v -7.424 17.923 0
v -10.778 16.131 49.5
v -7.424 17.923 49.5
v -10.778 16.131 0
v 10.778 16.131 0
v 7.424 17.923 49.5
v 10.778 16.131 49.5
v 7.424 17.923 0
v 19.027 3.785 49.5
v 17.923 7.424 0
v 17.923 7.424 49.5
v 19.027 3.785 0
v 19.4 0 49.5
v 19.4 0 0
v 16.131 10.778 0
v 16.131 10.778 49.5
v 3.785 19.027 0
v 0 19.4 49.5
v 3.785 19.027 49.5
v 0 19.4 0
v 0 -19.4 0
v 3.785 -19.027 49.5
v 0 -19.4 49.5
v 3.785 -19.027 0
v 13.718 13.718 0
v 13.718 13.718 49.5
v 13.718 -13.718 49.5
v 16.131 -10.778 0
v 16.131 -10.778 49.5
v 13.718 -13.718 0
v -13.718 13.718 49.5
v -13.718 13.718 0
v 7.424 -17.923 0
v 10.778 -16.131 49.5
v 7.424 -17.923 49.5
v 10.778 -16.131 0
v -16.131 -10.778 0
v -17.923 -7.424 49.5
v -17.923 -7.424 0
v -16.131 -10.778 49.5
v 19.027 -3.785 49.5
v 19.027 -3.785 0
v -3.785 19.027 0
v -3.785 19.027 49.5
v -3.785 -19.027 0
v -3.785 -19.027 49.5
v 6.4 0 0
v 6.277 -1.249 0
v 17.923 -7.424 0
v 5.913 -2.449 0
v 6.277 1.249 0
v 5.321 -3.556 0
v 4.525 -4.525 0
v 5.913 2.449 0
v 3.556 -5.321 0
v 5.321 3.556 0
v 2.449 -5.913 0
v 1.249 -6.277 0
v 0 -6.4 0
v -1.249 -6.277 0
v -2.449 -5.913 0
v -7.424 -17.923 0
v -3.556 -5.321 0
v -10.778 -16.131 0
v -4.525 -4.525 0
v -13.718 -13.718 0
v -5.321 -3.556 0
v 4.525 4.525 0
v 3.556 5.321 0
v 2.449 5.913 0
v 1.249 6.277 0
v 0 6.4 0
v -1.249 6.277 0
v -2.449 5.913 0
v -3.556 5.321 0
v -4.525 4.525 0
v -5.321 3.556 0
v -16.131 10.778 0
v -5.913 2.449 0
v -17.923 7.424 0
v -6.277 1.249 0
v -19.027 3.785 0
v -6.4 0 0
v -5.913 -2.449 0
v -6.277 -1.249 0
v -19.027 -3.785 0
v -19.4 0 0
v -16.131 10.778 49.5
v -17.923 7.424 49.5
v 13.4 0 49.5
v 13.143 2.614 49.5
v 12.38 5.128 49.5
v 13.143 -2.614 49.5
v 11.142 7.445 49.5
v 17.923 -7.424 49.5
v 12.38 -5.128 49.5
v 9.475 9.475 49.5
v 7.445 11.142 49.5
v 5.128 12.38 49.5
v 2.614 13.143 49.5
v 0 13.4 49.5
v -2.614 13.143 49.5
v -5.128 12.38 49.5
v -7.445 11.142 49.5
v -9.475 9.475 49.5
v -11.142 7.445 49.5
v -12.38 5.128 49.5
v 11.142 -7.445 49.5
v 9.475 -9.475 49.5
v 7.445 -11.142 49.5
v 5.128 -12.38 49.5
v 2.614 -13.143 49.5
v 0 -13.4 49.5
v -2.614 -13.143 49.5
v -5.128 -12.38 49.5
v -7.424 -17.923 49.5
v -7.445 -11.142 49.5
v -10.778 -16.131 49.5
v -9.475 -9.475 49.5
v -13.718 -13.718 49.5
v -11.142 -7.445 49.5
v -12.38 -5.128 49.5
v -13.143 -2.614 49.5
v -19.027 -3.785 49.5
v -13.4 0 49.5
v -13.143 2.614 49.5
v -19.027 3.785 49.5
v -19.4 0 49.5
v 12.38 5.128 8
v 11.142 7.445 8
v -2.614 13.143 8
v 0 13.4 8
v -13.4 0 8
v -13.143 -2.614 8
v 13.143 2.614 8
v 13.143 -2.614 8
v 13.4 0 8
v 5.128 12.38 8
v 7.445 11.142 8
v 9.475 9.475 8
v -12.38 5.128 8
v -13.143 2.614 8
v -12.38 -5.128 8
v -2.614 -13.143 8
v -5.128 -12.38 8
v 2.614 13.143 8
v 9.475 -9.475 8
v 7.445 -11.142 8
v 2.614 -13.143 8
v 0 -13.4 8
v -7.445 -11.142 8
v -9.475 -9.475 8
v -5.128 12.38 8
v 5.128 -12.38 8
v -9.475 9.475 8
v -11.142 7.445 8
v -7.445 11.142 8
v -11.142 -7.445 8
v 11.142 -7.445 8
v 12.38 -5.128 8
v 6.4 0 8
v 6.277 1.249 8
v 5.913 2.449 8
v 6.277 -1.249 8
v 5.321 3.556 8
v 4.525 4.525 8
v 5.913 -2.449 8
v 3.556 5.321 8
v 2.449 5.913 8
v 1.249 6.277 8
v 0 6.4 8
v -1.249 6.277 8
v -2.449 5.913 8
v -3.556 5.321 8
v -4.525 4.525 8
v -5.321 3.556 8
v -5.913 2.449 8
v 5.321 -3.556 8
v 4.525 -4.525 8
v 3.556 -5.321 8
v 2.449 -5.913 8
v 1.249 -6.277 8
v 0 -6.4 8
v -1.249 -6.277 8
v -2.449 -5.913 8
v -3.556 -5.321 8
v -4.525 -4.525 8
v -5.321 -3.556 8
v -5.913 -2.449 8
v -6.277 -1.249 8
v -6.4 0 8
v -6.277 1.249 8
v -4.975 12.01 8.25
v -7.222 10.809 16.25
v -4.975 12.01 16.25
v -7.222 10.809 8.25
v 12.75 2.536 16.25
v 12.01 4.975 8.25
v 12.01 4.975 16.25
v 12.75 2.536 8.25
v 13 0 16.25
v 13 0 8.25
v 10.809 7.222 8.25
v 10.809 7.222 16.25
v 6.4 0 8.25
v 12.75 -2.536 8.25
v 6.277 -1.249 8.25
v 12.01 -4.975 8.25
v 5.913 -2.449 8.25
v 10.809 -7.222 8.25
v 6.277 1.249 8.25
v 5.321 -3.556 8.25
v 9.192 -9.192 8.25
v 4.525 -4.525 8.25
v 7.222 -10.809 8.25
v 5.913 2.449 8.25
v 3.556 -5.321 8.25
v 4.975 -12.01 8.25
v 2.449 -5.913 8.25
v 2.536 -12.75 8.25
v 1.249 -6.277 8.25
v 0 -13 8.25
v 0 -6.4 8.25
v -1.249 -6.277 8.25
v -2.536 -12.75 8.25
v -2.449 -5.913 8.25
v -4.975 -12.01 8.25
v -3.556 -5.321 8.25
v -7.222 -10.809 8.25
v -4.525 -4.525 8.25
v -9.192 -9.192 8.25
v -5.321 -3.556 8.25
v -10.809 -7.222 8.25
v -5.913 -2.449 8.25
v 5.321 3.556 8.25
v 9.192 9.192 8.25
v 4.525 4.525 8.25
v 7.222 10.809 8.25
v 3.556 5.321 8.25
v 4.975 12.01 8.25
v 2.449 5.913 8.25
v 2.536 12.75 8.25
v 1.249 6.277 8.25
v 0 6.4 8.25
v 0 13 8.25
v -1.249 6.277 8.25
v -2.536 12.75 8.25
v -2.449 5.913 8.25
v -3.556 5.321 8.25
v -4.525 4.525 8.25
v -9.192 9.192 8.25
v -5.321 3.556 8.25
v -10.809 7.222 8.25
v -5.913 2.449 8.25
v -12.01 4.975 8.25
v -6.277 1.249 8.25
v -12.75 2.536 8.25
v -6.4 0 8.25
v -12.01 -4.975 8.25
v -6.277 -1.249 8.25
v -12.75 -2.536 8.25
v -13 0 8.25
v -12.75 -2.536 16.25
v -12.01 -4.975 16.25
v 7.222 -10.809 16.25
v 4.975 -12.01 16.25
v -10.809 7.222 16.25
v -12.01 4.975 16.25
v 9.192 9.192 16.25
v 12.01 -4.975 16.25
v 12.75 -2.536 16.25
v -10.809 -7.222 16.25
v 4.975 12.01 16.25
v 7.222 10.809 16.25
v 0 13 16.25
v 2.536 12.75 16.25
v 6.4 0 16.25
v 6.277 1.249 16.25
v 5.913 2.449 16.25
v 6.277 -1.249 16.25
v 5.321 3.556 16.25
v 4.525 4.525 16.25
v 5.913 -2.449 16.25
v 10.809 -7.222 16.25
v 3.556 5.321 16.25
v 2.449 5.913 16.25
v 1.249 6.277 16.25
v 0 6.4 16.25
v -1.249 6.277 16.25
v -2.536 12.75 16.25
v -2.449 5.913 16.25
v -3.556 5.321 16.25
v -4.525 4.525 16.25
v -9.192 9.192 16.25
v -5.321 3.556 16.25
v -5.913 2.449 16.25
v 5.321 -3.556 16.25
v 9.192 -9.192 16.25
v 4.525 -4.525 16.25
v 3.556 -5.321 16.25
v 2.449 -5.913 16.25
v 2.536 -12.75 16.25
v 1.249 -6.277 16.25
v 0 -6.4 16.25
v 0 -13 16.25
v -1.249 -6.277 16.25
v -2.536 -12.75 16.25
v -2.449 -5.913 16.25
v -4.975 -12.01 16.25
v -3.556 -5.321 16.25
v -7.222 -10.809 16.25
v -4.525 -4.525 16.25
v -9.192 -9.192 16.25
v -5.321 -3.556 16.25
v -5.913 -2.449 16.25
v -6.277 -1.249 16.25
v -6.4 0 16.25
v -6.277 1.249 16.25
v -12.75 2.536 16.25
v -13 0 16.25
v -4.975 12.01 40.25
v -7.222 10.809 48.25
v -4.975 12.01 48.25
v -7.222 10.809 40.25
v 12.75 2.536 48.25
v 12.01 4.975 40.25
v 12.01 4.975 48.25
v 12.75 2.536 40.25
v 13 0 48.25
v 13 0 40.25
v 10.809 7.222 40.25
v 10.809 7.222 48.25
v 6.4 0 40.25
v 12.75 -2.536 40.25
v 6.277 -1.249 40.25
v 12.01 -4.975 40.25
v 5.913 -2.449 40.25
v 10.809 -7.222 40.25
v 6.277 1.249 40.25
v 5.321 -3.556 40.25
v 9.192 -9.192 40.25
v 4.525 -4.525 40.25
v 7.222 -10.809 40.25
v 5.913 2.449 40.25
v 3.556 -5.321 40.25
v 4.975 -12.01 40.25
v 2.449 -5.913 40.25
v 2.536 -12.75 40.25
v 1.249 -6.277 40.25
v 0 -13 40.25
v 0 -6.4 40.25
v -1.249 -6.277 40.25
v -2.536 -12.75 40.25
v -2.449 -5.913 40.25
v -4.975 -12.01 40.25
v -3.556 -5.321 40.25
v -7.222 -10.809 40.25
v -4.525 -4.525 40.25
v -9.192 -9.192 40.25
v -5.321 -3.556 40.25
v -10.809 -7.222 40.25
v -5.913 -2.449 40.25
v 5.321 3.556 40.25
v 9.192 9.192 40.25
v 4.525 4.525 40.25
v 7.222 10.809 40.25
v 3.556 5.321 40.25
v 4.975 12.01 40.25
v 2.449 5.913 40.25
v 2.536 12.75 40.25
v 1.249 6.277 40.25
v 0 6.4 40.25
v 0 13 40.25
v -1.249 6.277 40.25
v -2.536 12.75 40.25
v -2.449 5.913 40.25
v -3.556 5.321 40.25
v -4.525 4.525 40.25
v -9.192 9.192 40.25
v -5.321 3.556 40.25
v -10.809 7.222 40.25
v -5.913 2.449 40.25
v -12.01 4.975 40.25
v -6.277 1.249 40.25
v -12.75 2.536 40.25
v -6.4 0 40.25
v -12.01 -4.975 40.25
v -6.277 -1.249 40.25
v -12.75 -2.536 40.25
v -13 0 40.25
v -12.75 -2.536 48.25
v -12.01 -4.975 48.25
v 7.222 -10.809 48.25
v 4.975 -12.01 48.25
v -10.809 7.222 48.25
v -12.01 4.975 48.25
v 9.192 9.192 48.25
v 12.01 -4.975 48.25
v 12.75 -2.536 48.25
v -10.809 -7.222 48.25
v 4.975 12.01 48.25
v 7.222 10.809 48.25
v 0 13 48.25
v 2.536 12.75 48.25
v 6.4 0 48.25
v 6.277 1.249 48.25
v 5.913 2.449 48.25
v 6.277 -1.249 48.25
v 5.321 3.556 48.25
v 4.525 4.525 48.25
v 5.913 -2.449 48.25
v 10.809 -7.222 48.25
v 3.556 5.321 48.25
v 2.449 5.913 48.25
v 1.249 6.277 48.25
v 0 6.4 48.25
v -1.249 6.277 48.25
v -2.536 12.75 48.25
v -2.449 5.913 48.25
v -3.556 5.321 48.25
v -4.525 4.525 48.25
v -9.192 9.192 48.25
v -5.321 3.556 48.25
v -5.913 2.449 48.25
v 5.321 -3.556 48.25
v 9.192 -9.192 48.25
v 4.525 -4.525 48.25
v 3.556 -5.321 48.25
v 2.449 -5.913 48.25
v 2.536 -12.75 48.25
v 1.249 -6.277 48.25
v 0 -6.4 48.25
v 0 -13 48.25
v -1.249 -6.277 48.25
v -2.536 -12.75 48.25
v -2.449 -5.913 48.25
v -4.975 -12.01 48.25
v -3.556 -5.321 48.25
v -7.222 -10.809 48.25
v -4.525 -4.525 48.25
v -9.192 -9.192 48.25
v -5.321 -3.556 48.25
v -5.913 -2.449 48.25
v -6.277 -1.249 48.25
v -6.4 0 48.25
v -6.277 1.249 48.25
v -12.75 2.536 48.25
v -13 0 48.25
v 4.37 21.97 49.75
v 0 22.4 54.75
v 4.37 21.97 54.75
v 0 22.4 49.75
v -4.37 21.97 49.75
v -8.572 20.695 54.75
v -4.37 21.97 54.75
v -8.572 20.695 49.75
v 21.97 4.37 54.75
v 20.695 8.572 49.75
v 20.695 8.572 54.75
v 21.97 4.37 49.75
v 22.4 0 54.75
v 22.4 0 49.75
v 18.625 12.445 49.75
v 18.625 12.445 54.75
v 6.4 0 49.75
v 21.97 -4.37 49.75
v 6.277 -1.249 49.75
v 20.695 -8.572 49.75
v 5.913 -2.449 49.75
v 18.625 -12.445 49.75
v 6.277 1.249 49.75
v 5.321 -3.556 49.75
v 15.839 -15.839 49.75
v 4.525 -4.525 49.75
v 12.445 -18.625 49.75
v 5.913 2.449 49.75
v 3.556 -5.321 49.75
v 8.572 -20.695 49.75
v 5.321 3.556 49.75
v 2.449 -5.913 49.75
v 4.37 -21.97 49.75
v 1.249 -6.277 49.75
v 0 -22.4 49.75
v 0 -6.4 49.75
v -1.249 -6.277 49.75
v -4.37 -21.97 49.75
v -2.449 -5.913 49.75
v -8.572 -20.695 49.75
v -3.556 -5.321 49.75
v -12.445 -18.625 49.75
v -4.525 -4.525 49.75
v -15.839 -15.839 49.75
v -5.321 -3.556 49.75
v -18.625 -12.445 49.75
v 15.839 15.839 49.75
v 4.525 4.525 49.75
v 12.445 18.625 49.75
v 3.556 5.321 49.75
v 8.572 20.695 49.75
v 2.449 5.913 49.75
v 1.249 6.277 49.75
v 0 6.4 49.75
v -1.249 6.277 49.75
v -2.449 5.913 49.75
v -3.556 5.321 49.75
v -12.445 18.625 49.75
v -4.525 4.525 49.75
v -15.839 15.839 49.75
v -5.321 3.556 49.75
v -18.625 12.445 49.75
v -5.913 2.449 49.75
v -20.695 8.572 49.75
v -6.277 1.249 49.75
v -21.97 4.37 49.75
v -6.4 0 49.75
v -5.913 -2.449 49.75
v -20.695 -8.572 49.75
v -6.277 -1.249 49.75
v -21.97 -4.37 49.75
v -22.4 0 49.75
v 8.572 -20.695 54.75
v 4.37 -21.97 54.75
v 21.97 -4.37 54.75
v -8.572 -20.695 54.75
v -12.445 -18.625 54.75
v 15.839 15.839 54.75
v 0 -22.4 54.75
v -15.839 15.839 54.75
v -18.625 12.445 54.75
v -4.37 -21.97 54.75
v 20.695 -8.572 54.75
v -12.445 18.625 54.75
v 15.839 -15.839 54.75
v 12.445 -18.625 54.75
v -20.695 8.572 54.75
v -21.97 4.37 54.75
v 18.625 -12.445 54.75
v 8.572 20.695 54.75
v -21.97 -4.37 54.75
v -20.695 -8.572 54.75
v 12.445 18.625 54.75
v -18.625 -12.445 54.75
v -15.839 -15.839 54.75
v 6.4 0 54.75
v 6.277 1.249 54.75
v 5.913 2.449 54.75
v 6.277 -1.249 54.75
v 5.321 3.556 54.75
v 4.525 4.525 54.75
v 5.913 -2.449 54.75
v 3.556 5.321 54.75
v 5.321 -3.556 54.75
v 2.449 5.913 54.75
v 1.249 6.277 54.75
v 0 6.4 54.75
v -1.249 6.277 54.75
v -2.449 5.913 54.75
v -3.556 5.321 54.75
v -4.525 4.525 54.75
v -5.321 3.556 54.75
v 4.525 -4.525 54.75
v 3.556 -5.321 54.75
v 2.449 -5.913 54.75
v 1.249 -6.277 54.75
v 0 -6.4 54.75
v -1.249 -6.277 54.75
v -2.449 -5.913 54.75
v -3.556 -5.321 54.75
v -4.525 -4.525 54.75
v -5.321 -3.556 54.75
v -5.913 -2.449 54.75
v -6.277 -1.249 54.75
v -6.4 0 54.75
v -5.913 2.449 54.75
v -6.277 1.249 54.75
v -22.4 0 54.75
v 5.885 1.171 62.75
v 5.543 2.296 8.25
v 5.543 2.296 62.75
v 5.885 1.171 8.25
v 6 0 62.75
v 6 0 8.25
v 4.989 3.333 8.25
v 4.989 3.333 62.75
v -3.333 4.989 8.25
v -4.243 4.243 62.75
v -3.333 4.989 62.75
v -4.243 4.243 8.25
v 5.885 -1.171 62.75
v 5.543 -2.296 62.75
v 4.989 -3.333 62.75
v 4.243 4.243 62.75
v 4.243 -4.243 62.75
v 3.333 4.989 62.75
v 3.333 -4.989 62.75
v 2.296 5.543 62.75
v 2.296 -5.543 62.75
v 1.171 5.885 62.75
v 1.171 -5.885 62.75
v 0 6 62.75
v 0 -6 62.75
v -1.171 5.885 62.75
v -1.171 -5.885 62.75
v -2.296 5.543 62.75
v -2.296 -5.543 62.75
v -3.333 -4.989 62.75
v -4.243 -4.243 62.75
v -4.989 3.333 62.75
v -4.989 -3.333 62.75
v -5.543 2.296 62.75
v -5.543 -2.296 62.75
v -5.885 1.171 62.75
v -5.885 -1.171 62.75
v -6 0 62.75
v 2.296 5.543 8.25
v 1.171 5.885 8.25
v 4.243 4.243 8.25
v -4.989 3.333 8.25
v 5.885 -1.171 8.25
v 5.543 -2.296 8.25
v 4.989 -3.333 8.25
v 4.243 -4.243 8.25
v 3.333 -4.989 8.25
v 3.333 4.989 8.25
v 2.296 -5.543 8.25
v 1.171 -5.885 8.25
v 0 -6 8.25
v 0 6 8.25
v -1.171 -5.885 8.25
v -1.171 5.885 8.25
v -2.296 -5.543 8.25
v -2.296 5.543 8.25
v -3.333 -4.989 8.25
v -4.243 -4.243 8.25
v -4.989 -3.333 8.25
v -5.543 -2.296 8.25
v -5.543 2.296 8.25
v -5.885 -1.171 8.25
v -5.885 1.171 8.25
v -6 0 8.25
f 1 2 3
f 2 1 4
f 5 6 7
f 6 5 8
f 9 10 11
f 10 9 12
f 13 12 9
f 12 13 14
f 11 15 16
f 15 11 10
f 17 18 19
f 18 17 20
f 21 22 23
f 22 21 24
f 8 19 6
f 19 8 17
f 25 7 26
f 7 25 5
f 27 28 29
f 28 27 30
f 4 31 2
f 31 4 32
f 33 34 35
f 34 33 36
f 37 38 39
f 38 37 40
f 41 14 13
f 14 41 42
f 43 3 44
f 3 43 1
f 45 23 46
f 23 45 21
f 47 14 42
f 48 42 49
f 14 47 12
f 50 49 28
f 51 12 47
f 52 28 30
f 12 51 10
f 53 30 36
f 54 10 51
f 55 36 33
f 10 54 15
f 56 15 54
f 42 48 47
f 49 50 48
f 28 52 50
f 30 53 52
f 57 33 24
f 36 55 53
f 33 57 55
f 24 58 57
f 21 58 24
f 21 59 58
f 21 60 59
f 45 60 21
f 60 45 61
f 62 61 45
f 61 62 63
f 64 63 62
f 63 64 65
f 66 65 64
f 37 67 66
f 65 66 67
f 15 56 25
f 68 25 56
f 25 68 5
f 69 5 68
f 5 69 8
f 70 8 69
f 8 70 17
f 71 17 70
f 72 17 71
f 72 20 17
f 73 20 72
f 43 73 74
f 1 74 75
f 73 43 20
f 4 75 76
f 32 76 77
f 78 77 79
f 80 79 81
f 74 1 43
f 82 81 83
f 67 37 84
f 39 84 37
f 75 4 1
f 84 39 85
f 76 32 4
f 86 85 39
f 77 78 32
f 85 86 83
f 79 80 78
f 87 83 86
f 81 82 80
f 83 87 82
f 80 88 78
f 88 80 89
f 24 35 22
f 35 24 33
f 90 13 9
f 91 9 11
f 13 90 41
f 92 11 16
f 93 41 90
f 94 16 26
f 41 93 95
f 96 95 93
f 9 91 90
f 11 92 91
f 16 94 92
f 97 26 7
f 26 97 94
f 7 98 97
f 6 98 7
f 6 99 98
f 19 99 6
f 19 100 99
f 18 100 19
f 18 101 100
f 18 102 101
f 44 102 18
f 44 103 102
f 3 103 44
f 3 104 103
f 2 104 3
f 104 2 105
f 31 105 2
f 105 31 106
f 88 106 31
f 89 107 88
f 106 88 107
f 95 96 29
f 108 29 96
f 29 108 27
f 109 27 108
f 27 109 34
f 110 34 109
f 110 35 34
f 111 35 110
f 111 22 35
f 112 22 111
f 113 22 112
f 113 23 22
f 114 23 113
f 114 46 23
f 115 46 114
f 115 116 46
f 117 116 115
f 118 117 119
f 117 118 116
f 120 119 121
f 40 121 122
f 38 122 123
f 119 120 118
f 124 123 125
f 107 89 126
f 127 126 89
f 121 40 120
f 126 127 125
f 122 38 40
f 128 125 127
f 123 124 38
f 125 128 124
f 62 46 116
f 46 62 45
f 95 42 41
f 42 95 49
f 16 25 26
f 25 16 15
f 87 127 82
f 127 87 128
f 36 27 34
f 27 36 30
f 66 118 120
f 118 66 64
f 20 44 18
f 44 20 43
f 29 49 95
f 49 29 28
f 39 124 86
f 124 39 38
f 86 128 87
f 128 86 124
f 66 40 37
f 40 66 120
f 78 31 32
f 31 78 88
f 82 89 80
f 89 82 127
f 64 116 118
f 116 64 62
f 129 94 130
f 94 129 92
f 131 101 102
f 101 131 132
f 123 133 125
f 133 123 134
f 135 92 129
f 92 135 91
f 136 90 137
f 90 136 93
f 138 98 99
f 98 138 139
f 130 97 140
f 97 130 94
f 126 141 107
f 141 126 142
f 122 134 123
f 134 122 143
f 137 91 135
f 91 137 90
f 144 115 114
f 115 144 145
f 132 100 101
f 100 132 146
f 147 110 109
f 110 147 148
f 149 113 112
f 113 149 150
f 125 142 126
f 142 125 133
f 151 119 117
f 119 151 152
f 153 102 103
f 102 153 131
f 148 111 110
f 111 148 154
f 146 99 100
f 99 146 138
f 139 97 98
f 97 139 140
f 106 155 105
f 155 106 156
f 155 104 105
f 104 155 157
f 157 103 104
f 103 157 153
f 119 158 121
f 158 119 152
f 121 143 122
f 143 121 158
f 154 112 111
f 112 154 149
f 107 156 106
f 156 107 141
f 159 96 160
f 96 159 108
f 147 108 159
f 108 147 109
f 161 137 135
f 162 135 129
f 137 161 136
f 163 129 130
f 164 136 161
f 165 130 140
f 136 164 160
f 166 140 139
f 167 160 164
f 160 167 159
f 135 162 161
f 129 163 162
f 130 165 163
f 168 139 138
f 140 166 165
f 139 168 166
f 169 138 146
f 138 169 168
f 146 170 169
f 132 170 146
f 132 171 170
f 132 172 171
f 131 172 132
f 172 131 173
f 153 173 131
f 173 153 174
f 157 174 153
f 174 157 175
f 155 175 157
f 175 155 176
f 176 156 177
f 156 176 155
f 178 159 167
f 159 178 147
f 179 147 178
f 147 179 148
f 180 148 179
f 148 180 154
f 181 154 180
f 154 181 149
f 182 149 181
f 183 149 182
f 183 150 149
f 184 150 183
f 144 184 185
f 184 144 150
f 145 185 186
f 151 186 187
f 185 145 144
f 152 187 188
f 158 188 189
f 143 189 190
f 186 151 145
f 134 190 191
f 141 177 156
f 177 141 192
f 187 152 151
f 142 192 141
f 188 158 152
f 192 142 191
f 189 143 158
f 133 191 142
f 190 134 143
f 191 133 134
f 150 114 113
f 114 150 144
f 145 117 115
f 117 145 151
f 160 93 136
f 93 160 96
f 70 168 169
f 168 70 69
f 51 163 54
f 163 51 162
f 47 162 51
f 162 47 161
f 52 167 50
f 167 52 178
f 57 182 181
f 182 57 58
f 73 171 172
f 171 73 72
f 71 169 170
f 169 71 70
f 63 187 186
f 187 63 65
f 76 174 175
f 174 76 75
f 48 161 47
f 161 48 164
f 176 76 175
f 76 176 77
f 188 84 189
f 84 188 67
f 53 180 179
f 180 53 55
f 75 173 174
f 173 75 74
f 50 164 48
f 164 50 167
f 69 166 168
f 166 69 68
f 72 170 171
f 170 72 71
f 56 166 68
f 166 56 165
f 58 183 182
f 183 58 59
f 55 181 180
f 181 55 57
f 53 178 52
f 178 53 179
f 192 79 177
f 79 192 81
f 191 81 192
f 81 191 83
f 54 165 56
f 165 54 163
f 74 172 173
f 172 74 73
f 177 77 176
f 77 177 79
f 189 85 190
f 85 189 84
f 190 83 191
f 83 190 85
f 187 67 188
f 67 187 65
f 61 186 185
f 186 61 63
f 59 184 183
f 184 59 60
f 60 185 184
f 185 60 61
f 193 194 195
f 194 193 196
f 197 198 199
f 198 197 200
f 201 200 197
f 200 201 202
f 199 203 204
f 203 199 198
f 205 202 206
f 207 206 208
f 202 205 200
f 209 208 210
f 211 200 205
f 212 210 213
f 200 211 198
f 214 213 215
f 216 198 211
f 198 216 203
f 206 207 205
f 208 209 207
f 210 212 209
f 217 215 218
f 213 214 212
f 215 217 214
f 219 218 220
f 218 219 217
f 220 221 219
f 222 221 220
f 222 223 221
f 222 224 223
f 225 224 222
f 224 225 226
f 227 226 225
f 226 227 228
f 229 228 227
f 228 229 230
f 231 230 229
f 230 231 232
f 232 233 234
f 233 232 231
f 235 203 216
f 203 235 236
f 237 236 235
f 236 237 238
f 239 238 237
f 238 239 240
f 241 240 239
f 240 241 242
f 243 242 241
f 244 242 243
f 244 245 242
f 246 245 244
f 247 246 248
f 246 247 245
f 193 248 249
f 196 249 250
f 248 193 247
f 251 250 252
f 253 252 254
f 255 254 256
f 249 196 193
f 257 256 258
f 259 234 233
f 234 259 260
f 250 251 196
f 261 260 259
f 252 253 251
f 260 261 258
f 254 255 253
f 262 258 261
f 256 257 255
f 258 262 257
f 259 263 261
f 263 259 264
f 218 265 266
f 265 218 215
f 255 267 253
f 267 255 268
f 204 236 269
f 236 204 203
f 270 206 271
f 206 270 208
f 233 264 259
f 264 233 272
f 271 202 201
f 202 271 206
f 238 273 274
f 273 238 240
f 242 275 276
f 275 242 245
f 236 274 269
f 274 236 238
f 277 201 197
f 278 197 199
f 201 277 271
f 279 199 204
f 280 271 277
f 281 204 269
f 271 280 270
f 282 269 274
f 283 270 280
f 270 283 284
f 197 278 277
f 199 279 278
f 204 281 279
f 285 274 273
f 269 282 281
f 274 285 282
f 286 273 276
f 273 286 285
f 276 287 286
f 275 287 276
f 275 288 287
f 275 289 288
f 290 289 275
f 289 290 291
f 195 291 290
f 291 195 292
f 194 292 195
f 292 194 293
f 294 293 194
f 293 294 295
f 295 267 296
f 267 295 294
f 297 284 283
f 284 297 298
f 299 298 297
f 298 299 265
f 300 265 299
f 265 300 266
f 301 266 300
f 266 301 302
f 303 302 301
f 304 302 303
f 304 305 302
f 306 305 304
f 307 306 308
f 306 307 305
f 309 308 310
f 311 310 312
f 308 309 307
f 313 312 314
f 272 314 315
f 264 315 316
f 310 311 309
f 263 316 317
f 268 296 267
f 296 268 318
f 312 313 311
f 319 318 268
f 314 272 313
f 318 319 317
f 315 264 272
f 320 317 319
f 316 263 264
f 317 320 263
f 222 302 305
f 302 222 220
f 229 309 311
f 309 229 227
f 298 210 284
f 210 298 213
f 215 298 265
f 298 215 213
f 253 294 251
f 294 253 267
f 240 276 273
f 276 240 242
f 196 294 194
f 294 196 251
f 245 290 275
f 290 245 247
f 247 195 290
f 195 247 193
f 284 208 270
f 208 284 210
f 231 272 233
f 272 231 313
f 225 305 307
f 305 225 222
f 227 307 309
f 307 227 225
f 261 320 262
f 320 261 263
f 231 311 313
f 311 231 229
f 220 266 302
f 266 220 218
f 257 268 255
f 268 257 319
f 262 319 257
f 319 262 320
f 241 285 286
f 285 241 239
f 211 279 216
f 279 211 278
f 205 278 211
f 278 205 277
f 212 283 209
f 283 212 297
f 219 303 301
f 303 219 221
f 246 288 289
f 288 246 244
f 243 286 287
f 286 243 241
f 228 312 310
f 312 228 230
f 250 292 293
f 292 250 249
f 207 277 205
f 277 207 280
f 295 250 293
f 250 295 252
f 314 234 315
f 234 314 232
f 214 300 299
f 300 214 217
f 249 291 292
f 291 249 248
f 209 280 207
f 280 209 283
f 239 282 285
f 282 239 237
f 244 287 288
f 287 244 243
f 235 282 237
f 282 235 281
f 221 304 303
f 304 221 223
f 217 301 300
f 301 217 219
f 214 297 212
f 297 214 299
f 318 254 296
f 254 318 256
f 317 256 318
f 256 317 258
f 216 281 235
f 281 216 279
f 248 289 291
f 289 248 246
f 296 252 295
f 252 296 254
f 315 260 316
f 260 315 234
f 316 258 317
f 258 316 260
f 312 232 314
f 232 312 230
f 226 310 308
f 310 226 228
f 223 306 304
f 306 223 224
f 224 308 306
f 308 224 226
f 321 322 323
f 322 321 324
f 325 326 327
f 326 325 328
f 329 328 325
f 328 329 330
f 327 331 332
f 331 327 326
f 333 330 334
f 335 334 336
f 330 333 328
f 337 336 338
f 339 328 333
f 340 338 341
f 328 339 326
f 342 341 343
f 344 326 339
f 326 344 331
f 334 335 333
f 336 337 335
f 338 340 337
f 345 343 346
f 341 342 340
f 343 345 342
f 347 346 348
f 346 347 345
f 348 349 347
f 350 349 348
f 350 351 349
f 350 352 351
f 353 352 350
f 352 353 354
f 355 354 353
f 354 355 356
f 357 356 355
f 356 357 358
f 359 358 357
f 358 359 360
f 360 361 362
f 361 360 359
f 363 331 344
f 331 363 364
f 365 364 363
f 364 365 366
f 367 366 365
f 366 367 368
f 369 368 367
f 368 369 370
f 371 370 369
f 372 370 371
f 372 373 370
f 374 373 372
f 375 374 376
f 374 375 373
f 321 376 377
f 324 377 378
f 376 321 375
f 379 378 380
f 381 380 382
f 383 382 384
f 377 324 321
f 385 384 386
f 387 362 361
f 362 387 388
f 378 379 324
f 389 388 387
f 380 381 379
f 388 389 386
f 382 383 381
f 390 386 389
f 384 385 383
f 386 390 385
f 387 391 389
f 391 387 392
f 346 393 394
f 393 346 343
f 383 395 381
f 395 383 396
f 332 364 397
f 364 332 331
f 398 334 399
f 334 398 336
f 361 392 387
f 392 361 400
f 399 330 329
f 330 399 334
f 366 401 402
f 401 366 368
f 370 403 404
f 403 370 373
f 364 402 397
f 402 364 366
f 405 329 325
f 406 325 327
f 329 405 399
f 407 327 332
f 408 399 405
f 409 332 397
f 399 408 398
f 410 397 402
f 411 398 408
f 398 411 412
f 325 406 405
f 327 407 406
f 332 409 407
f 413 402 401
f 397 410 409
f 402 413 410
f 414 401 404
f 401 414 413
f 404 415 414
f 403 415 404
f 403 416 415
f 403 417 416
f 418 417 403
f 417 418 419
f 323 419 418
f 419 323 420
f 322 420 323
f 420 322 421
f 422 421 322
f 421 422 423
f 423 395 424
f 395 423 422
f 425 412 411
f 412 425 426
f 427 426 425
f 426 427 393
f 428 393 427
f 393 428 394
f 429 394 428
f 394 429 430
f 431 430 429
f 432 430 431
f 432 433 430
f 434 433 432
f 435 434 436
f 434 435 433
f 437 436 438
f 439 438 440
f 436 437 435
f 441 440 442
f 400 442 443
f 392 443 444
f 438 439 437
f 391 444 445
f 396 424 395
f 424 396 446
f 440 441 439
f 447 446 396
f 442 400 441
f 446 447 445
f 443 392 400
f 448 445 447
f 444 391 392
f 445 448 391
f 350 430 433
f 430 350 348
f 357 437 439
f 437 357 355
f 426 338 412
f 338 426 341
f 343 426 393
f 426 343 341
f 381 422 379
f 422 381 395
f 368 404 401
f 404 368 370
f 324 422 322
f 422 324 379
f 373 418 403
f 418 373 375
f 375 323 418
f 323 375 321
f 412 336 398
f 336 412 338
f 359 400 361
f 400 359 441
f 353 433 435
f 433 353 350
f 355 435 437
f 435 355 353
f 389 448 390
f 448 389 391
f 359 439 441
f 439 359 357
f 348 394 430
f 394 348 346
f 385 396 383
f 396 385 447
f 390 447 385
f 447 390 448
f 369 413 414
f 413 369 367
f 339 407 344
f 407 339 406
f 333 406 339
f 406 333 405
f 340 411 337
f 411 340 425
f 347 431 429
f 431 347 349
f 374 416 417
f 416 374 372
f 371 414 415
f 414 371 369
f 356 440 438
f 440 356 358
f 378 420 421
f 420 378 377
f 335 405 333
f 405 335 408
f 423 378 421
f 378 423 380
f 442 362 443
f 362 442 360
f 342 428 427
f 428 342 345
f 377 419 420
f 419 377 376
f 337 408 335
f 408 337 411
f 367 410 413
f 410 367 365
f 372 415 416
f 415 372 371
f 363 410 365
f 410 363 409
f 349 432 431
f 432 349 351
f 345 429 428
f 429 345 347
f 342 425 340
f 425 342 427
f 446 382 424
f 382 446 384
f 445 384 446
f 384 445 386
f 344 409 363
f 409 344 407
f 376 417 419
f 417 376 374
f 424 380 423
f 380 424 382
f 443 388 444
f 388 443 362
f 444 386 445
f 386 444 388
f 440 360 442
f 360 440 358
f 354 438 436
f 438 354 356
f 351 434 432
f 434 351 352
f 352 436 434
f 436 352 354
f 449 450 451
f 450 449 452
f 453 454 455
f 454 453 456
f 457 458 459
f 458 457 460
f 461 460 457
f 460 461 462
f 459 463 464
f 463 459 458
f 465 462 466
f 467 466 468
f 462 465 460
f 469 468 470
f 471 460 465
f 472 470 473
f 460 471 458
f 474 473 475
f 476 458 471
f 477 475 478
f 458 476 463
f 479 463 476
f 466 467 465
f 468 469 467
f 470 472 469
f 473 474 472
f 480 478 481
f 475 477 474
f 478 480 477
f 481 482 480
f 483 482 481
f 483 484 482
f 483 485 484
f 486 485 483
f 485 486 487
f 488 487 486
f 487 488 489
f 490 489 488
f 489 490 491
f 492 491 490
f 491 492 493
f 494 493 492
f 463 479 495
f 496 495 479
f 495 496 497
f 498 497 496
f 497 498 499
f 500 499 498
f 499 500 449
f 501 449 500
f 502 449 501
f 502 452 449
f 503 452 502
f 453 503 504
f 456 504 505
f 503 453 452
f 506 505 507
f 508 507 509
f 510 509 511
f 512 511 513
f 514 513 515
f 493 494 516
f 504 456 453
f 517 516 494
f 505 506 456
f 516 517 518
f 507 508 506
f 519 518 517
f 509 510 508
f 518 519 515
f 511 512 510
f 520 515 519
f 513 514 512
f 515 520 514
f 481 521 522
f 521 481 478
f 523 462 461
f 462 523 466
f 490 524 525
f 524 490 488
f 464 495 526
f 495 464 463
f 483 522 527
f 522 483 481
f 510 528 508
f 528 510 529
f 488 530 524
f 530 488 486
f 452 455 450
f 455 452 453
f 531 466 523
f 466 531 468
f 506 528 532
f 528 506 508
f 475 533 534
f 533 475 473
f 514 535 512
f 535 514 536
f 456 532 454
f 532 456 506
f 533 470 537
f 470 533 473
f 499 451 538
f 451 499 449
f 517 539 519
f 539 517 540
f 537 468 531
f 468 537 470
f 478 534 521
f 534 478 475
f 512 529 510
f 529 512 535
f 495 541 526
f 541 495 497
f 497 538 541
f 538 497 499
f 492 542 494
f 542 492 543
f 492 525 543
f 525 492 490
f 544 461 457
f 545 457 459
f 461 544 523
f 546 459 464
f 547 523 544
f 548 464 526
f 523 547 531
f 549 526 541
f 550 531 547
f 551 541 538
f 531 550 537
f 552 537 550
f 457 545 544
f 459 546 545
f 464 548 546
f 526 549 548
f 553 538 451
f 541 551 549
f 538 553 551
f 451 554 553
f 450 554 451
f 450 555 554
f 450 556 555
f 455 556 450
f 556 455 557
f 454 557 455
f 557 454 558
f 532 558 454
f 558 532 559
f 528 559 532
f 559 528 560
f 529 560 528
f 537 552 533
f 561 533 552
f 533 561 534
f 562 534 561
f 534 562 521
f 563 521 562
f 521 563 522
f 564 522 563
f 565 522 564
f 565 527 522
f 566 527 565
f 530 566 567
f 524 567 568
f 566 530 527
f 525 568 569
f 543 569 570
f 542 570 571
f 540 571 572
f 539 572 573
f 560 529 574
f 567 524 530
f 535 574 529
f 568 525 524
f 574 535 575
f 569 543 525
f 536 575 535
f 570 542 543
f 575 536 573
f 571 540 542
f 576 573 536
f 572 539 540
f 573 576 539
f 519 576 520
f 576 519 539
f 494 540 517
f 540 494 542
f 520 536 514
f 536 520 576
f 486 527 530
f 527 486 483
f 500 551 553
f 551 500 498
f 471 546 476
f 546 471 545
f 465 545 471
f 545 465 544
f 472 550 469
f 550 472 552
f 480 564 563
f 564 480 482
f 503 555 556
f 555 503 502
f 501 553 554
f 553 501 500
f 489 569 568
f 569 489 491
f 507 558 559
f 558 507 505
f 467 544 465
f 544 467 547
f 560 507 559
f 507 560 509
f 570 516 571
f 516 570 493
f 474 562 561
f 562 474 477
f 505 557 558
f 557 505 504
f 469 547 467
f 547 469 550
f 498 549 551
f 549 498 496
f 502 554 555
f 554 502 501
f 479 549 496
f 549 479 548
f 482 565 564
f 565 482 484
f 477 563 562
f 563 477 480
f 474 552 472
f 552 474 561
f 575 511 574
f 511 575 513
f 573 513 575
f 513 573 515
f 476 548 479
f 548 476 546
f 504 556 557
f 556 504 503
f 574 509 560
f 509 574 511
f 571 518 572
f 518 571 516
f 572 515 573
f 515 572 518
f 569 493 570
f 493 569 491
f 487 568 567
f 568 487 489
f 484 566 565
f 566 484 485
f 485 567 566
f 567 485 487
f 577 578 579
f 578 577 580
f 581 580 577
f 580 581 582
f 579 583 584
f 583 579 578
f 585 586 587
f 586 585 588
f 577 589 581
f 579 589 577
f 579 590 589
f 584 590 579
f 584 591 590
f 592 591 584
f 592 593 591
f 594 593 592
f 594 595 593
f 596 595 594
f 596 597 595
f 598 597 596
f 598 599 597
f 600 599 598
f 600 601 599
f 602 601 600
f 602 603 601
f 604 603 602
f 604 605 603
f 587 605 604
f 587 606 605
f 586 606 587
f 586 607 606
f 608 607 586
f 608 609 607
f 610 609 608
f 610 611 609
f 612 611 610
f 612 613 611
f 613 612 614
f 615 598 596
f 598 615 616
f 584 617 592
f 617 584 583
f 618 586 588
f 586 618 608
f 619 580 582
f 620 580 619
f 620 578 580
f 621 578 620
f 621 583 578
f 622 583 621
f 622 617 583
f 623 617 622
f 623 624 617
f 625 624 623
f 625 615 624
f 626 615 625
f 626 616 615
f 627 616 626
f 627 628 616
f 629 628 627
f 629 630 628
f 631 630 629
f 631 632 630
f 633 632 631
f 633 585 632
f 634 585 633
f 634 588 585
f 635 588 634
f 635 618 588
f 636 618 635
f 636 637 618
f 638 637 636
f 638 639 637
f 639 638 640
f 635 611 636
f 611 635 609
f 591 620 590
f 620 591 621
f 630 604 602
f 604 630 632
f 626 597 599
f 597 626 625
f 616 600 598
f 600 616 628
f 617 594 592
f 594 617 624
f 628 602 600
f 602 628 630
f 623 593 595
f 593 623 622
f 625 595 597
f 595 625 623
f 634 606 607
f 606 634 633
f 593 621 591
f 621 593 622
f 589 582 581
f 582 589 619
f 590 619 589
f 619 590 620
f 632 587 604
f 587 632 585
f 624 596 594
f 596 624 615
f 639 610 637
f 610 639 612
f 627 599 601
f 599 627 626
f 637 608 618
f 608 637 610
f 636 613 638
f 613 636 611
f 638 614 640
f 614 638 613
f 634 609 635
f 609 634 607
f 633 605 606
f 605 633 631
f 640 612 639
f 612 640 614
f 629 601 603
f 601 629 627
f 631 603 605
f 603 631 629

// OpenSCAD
$fn = 32;

// ------------------------------------------------------------------------
// Shaft station: cup d38.8 x 49.5 mm, shaft d12
// Every part is its own module, assembly() places every instance.
// ------------------------------------------------------------------------

// --- part 1 ---
module housing_cup() {
  difference() {
    cylinder(h = 49.5, d = 38.8);
    translate([0, 0, 8]) cylinder(h = 42.5, d = 26.8);
    translate([0, 0, -1]) cylinder(h = 10, d = 12.8);
  }
}

// --- part 2 ---
module bearing_lower() {
  difference() {
      translate([0, 0, 0]) cylinder(h = 8, d = 26);
      translate([0, 0, -1]) cylinder(h = 10, d = 12.8);
    }
}

// --- part 3 ---
module bearing_upper() {
  difference() {
      translate([0, 0, 0]) cylinder(h = 8, d = 26);
      translate([0, 0, -1]) cylinder(h = 10, d = 12.8);
    }
}

// --- part 4 ---
module station_shaft() {
  translate([0, 0, -27.25]) cylinder(h = 54.5, d = 12);
}

// --- part 5 ---
module station_cover() {
  difference() {
    cylinder(h = 5, d = 44.8);
    translate([0, 0, -1]) cylinder(h = 7, d = 12.8);
  }
}

// --- assembly ---
module assembly() {
  color([0.80, 0.24, 0.20]) translate([0, 0, 0]) rotate([0, 0, 0]) housing_cup();
  color([0.20, 0.45, 0.75]) translate([0, 0, 8.25]) rotate([0, 0, 0]) bearing_lower();
  color([0.25, 0.62, 0.32]) translate([0, 0, 40.25]) rotate([0, 0, 0]) bearing_upper();
  color([0.92, 0.70, 0.18]) translate([0, 0, 35.5]) rotate([0, 0, 0]) station_shaft();
  color([0.58, 0.35, 0.70]) translate([0, 0, 49.75]) rotate([0, 0, 0]) station_cover();
}

assembly();
